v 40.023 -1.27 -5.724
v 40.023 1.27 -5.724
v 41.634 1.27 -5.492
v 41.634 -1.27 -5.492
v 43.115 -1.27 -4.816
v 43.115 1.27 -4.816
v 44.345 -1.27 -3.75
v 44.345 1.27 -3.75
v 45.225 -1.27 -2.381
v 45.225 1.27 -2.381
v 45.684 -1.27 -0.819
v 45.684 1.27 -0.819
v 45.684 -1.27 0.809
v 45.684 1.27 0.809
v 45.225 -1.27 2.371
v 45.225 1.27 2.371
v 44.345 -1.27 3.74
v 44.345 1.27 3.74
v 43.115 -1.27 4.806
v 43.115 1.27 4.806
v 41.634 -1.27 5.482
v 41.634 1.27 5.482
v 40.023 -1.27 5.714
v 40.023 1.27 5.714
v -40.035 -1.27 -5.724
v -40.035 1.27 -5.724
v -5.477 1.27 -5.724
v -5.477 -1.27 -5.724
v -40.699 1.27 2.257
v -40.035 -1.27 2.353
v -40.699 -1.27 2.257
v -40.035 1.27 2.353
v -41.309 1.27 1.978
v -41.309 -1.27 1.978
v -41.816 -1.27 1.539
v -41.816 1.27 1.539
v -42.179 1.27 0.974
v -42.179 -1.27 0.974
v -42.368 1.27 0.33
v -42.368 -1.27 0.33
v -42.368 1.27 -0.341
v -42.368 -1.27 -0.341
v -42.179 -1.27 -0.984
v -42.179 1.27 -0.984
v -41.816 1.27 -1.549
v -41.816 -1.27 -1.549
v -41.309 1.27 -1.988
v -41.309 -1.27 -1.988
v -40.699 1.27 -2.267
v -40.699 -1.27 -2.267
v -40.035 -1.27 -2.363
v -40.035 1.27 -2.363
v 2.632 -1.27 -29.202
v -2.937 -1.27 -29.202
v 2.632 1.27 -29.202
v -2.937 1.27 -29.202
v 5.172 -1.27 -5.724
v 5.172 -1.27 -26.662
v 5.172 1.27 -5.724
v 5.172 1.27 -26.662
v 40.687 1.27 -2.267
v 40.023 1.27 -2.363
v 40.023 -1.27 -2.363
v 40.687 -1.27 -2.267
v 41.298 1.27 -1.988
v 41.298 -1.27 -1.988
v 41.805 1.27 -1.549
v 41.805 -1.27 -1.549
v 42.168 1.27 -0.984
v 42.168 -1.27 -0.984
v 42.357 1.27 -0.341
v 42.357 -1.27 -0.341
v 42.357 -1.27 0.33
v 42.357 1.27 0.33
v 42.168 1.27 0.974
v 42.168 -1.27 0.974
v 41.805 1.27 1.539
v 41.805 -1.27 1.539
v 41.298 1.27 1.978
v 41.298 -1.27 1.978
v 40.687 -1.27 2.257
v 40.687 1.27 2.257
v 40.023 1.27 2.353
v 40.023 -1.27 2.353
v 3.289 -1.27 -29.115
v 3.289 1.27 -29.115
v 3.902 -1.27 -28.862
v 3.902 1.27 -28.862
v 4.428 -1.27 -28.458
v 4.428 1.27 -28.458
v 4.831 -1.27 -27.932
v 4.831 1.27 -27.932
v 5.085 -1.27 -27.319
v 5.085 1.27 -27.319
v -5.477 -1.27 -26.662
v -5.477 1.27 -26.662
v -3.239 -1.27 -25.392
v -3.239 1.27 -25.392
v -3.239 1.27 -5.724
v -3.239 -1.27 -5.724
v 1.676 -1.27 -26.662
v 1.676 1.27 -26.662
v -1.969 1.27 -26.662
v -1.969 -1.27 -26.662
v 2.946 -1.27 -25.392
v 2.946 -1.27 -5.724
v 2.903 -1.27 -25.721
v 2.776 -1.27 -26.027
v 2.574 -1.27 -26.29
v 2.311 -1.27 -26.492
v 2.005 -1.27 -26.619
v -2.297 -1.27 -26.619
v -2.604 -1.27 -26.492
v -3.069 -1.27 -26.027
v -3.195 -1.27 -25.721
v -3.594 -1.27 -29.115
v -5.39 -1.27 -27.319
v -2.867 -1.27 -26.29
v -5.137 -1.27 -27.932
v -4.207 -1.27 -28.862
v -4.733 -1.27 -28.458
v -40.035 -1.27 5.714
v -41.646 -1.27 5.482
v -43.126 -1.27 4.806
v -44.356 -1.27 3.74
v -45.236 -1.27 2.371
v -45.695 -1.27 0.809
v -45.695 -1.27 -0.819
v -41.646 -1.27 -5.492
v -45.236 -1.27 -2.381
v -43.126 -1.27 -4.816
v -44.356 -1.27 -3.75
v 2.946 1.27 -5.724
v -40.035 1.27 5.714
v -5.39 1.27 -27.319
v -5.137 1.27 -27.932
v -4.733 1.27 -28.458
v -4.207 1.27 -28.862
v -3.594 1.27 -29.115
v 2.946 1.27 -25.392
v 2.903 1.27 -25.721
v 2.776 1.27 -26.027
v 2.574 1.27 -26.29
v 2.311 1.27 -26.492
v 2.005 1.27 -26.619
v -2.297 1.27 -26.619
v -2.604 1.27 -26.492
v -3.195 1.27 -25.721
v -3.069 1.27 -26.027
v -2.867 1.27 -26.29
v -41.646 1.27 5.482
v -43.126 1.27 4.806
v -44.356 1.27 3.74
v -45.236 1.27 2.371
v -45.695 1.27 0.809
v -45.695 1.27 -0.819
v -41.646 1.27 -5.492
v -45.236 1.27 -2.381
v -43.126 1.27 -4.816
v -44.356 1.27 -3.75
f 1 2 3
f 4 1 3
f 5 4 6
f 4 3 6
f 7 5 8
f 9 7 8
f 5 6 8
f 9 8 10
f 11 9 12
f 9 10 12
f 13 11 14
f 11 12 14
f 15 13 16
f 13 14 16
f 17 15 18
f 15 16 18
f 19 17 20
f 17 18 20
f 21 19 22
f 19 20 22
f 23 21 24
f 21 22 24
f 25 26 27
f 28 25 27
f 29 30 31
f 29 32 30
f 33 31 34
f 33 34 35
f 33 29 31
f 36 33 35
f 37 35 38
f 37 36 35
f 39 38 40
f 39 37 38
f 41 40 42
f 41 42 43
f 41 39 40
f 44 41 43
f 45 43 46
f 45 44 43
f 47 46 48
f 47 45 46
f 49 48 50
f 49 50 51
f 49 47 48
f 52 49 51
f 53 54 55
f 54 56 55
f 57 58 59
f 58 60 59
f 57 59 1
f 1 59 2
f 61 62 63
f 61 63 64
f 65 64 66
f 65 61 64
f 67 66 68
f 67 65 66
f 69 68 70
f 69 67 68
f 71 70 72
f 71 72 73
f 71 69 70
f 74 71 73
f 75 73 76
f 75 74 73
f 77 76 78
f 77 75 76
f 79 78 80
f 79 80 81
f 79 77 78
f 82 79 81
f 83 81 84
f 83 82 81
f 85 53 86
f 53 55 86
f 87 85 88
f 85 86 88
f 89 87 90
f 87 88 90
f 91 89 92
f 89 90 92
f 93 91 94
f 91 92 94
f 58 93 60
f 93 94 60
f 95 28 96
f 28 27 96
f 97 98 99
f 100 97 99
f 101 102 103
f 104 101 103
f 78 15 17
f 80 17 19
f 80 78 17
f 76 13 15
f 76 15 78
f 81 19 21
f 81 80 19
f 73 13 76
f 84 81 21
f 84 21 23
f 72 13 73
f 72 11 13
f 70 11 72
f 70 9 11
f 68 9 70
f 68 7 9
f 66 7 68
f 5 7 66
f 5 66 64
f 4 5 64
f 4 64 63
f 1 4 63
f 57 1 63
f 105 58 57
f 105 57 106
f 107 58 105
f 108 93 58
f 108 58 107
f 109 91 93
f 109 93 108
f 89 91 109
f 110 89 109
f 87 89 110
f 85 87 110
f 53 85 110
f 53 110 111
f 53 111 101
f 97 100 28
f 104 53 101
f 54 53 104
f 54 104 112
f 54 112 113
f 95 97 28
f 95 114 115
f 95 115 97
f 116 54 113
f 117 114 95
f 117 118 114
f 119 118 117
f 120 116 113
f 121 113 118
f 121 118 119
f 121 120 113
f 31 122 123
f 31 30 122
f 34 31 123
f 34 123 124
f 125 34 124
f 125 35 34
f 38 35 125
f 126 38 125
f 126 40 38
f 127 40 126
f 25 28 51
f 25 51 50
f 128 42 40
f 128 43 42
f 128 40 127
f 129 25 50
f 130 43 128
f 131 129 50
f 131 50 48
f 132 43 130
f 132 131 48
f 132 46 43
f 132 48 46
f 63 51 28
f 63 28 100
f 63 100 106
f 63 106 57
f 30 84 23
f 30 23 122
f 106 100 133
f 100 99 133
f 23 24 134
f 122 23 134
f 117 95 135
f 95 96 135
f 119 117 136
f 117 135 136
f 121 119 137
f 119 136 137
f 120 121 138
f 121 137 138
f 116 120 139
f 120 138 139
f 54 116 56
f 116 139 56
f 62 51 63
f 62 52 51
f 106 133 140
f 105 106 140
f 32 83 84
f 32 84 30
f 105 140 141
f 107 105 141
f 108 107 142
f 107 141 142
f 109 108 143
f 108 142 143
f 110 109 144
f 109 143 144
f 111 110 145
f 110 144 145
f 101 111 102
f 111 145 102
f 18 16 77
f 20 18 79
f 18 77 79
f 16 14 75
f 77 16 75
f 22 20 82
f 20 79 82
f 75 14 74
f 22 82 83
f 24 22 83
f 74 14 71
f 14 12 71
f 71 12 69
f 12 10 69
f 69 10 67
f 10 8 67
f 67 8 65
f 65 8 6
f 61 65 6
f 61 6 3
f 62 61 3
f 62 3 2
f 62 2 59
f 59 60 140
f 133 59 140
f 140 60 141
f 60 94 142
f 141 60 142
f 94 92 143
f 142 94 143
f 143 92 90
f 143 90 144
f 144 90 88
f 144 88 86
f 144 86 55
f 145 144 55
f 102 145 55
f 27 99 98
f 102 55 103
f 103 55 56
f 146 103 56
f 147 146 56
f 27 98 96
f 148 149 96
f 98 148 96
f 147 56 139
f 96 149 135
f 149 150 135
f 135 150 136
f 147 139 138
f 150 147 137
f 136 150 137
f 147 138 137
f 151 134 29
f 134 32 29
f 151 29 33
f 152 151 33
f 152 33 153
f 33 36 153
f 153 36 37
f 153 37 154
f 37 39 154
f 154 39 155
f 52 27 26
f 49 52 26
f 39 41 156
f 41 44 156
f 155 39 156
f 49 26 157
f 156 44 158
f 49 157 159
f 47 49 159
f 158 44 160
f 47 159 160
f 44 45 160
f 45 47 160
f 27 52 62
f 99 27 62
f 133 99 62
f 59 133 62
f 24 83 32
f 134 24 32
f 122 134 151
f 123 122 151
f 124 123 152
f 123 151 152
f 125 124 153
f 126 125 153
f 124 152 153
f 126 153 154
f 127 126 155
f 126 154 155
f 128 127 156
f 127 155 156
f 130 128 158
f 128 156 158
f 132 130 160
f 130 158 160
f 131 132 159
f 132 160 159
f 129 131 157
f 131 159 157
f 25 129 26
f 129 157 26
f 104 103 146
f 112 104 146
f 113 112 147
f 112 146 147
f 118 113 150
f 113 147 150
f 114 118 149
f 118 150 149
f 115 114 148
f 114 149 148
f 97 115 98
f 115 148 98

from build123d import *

# Parameters (mm, degrees)
BOSS_EXTRUDE10_DEPTH = 1.27


with BuildPart() as part:
    # Sketch1 → Boss-Extrude10 (new, symmetric)
    with BuildSketch(Plane(origin=(0, 0, 0), x_dir=(1, 0, 0), z_dir=(0, 1, 0))):
        with BuildLine():
            Line((-40.034645199, 5.723587865), (-5.476888276, 5.723587865))
            Line((-5.476888276, 5.723587865), (-5.476888276, 26.661855827))
            ThreePointArc((-5.476888276, 26.661855827), (-4.732939501, 28.457907051), (-2.936888276, 29.201855827))
            Line((-2.936888276, 29.201855827), (2.631615538, 29.201855827))
            ThreePointArc((2.631615538, 29.201855827), (4.427666762, 28.457907051), (5.171615538, 26.661855827))
            Line((5.171615538, 26.661855827), (5.171615538, 5.723587865))
            Line((5.171615538, 5.723587865), (40.023244529, 5.723587865))
            ThreePointArc((40.023244529, 5.723587865), (45.741799588, 0.005032806), (40.023244529, -5.713522253))
            Line((40.023244529, -5.713522253), (-40.034645199, -5.713522253))
            ThreePointArc((-40.034645199, -5.713522253), (-45.753200258, 0.005032806), (-40.034645199, 5.723587865))
        make_face()
        with BuildLine():
            Line((-40.034645199, 2.362682699), (40.023244529, 2.362682699))
            ThreePointArc((40.023244529, 2.362682699), (42.380894421, 0.005032806), (40.023244529, -2.352617087))
            Line((40.023244529, -2.352617087), (-40.034645199, -2.352617087))
            ThreePointArc((-40.034645199, -2.352617087), (-42.392295092, 0.005032806), (-40.034645199, 2.362682699))
        make_face(mode=Mode.SUBTRACT)
        with BuildLine():
            Line((-3.238670488, 5.723587865), (2.946447825, 5.723587865))
            Line((2.946447825, 5.723587865), (2.946447825, 25.391855827))
            ThreePointArc((2.946447825, 25.391855827), (2.574473437, 26.289881439), (1.676447825, 26.661855827))
            Line((1.676447825, 26.661855827), (-1.968670488, 26.661855827))
            ThreePointArc((-1.968670488, 26.661855827), (-2.8666961, 26.289881439), (-3.238670488, 25.391855827))
            Line((-3.238670488, 25.391855827), (-3.238670488, 5.723587865))
        make_face(mode=Mode.SUBTRACT)
    extrude(amount=BOSS_EXTRUDE10_DEPTH, both=True)


solid = part.part
